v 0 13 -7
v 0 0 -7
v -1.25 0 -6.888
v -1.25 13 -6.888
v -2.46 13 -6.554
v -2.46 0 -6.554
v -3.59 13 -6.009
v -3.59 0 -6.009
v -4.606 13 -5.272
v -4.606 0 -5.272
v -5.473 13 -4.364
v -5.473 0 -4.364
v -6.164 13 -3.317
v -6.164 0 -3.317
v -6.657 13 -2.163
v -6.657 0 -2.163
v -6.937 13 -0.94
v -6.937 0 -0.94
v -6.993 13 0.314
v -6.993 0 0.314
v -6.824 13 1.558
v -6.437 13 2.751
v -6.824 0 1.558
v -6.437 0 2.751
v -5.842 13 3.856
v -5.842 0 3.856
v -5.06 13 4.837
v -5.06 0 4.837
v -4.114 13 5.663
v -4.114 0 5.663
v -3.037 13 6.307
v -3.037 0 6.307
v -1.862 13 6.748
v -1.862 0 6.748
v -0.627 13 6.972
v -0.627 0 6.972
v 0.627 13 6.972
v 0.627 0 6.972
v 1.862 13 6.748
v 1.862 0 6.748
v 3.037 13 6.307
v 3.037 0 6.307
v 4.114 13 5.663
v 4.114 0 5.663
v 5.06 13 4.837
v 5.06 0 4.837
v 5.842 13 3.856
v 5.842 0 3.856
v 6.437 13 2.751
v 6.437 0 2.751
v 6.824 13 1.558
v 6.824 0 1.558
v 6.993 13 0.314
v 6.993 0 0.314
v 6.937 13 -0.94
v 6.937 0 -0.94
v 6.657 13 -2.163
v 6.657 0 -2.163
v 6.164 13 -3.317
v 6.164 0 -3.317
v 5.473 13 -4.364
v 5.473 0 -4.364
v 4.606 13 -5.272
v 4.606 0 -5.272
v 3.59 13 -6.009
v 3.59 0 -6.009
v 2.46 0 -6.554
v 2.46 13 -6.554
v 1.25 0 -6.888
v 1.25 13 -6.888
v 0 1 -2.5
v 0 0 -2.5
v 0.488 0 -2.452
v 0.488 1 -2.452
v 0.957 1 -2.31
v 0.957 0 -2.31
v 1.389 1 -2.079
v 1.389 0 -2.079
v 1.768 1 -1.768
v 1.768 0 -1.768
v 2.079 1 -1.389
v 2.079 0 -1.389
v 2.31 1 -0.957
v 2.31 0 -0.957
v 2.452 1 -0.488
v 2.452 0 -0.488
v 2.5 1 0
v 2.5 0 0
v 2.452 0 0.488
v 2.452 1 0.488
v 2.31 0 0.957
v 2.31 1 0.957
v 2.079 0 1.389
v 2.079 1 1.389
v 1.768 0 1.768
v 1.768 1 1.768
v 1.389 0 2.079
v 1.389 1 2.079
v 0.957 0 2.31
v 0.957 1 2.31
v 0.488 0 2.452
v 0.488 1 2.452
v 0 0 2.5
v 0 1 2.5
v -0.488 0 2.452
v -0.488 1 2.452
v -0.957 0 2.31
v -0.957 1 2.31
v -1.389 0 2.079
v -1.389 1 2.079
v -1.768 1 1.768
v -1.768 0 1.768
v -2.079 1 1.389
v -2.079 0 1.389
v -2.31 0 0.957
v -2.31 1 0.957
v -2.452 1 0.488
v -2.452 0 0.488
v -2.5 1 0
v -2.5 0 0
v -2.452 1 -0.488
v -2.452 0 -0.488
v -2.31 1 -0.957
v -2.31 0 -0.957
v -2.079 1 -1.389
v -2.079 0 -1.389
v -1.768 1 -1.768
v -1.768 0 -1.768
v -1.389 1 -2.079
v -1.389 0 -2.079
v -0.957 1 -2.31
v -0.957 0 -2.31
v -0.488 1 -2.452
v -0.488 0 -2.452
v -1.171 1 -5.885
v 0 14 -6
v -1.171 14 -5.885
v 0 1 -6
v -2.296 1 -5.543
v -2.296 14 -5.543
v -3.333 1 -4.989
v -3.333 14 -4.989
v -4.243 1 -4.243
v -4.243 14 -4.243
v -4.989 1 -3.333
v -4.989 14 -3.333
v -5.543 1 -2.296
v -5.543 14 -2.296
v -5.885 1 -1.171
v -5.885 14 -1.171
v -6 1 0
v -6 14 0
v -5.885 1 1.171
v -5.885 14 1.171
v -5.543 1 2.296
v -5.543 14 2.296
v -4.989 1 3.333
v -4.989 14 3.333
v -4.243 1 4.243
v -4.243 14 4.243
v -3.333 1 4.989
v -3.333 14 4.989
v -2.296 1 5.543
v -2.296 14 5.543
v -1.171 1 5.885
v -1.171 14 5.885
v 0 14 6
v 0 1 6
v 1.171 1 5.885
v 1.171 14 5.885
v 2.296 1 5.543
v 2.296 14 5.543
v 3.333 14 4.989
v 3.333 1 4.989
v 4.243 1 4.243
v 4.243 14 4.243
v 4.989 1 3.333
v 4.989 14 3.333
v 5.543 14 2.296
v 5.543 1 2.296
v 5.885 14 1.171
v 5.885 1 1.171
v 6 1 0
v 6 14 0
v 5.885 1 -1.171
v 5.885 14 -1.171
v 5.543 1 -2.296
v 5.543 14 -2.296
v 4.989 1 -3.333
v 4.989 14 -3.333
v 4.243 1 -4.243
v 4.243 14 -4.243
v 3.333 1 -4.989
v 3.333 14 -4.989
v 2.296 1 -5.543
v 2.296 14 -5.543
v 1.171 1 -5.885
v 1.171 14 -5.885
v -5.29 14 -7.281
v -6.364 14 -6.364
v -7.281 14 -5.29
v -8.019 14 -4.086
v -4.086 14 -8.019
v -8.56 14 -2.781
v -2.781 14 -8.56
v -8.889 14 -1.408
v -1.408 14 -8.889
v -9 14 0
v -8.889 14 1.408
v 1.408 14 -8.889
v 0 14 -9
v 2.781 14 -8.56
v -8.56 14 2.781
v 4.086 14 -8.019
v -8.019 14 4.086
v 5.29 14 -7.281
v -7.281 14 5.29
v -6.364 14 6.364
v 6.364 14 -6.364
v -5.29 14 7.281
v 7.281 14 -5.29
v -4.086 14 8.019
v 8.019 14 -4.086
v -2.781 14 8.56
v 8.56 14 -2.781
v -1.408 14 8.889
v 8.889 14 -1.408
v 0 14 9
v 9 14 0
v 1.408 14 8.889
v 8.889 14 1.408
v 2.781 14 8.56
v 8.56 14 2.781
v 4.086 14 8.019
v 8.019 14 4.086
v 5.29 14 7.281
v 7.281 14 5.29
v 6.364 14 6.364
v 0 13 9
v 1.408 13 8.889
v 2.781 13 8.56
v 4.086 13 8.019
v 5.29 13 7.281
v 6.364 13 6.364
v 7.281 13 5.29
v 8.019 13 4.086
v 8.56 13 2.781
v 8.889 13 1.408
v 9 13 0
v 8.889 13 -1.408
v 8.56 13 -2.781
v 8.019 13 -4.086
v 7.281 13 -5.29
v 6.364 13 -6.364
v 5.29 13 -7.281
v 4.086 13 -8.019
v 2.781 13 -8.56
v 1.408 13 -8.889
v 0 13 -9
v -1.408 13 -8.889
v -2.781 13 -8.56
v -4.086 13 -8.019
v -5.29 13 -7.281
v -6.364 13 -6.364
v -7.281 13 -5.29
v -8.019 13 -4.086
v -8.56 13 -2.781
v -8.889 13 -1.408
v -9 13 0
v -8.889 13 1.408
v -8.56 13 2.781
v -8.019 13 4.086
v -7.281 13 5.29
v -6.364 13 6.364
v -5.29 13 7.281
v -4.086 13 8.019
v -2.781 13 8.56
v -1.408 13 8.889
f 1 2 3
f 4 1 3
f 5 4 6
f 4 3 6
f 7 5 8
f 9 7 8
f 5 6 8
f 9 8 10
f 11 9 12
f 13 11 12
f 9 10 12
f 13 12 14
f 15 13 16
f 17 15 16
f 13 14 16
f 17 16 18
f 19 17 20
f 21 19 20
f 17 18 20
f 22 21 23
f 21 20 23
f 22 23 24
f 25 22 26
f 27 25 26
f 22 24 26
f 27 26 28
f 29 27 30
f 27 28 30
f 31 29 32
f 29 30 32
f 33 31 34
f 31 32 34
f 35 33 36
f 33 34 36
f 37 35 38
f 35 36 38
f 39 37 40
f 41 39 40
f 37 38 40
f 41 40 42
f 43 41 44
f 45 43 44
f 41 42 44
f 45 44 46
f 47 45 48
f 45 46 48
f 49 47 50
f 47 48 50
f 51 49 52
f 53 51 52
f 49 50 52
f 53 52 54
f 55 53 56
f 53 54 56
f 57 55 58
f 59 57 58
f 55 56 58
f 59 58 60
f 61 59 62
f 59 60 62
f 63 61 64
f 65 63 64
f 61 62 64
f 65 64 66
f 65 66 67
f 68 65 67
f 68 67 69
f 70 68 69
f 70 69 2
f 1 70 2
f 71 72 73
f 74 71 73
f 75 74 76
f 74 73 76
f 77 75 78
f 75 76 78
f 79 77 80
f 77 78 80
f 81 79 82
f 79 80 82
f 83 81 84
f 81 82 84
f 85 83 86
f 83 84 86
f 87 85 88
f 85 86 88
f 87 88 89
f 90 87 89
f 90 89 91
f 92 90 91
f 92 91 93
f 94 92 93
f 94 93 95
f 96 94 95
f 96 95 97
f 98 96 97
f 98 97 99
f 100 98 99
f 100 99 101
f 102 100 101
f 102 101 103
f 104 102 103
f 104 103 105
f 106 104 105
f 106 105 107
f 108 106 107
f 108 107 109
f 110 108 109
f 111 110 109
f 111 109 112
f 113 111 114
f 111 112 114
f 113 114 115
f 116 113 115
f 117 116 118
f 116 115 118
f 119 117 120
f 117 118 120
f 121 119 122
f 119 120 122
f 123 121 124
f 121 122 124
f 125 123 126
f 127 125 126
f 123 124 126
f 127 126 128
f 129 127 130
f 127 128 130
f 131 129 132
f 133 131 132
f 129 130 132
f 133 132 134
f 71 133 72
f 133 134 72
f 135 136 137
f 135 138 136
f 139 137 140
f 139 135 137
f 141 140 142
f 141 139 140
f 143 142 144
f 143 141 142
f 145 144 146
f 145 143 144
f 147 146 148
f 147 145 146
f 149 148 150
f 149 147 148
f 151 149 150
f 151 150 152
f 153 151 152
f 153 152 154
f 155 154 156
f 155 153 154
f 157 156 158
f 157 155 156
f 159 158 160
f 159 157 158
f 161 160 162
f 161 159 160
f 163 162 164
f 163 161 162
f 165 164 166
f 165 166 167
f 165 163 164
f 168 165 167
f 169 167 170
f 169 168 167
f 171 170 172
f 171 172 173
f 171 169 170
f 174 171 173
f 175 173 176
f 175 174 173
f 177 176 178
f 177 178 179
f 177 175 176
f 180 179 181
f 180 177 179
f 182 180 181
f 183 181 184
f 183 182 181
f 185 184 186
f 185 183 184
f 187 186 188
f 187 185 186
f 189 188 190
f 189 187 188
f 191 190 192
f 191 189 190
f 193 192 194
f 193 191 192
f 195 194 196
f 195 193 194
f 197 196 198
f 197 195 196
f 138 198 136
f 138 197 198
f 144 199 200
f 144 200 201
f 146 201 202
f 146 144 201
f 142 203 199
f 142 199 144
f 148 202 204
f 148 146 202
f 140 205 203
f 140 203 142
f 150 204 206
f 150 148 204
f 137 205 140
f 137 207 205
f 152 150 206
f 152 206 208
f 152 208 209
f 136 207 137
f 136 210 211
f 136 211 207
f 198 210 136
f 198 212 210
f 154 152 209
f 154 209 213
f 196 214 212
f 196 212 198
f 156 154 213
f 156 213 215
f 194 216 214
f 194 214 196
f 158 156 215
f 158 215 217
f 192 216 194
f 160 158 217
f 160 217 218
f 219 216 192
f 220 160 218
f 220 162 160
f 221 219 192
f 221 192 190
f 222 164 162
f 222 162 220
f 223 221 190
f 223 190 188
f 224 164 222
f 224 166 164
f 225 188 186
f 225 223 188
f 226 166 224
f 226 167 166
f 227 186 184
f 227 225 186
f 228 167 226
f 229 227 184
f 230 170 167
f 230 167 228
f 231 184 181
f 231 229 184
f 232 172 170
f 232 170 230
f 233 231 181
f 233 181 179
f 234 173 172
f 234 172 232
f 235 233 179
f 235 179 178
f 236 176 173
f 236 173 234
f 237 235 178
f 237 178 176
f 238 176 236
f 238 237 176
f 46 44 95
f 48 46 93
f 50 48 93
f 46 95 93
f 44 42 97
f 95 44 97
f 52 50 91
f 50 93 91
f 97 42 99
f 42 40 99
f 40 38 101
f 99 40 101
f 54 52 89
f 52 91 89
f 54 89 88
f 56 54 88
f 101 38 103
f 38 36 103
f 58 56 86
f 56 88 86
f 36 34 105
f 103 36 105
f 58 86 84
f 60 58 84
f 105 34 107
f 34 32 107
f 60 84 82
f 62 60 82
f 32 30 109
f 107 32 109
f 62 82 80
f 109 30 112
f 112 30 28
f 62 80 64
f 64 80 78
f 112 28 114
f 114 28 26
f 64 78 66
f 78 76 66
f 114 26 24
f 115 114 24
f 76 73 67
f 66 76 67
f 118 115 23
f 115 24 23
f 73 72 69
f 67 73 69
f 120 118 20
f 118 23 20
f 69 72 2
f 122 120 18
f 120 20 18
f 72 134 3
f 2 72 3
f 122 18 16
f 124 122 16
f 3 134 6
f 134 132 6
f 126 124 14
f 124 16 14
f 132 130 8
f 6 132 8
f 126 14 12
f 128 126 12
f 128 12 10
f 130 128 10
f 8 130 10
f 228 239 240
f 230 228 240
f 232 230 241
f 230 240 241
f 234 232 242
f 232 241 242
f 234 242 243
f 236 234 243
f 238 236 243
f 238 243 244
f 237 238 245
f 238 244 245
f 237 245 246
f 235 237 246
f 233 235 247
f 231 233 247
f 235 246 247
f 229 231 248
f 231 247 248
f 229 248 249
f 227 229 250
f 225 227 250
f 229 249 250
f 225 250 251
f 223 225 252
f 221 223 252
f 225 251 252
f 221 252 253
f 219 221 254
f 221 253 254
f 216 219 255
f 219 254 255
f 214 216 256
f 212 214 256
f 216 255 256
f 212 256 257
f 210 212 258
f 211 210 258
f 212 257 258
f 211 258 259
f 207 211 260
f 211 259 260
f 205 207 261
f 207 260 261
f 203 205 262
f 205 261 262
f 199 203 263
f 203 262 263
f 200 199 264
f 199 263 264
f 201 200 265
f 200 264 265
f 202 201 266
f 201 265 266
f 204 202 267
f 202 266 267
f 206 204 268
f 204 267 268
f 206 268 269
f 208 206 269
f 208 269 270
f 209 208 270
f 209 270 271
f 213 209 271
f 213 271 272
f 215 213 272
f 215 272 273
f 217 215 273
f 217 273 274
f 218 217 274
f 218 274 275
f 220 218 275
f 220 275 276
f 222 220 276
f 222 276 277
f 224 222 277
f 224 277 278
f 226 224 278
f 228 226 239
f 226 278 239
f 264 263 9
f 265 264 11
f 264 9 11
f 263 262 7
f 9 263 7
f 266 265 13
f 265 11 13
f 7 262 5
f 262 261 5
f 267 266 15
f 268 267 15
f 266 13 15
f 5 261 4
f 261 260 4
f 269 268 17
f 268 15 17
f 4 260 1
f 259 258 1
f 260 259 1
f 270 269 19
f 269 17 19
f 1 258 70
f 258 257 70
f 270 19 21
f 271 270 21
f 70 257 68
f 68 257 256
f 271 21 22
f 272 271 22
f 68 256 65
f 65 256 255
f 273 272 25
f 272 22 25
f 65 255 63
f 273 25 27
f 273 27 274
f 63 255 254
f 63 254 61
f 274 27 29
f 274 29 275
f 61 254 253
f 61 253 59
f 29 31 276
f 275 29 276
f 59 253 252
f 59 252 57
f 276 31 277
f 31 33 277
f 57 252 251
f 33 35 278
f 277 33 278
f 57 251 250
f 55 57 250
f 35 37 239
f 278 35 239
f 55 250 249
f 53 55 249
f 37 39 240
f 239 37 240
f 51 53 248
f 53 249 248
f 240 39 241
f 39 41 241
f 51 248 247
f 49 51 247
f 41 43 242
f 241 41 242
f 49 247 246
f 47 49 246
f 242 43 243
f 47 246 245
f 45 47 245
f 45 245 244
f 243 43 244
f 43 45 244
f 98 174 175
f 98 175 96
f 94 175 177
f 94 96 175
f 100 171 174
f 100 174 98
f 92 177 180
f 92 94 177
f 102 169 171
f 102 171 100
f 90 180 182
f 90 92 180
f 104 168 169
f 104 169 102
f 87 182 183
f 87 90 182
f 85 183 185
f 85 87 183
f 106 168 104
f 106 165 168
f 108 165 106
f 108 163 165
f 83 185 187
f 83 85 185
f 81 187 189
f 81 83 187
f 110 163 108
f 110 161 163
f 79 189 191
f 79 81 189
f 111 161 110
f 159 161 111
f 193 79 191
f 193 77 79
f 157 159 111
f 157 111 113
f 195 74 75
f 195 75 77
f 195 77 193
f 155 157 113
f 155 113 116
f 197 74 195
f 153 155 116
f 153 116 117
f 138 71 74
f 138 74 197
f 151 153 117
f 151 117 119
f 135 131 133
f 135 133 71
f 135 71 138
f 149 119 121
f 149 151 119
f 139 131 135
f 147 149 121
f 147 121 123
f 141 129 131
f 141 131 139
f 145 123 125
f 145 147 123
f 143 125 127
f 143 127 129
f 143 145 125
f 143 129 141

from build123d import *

# Parameters (mm, degrees)
SKETCH1_R           = 7
BOSS_EXTRUDE1_DEPTH = 13
SHELL2_T            = -1
SKETCH2_R           = 2.5
CUT_EXTRUDE1_DEPTH  = 10
SKETCH3_R           = 9
BOSS_EXTRUDE2_DEPTH = 1
CUT_EXTRUDE2_START  = -2
SKETCH4_R           = 6
CUT_EXTRUDE2_DEPTH  = 2


with BuildPart() as part:
    # Sketch1 → Boss-Extrude1 (new body)
    with BuildSketch(Plane(origin=(0, 0, 0), x_dir=(1, 0, 0), z_dir=(0, 1, 0))):
        with Locations(Location((0, 0, 0), (0, 0, 90))):
            Circle(SKETCH1_R)
    extrude(amount=BOSS_EXTRUDE1_DEPTH)

    # Shell2
    shell2_openings = [part.faces().sort_by_distance(p)[0] for p in [
        (0, 13, 0),
    ]]
    offset(amount=SHELL2_T, openings=shell2_openings, kind=Kind.INTERSECTION)

    # Sketch2 → Cut-Extrude1 (cut)
    with BuildSketch(Plane.XZ):
        with Locations(Location((0, 0, 0), (0, 0, 270))):
            Circle(SKETCH2_R)
    extrude(amount=-CUT_EXTRUDE1_DEPTH, mode=Mode.SUBTRACT)

    # Sketch3 → Boss-Extrude2 (add)
    with BuildSketch(Plane(origin=(0, 13, 0), x_dir=(1, 0, 0), z_dir=(0, 1, 0))):
        with Locations(Location((0, 0, 0), (0, 0, 270))):
            Circle(SKETCH3_R)
    extrude(amount=BOSS_EXTRUDE2_DEPTH)

    # Sketch4 → Cut-Extrude2 (cut)
    with BuildSketch(Plane(origin=(0, 14, 0), x_dir=(1, 0, 0), z_dir=(0, 1, 0)).offset(CUT_EXTRUDE2_START)):
        with Locations(Location((0, 0, 0), (0, 0, 90))):
            Circle(SKETCH4_R)
    extrude(amount=CUT_EXTRUDE2_DEPTH, mode=Mode.SUBTRACT)


solid = part.part
